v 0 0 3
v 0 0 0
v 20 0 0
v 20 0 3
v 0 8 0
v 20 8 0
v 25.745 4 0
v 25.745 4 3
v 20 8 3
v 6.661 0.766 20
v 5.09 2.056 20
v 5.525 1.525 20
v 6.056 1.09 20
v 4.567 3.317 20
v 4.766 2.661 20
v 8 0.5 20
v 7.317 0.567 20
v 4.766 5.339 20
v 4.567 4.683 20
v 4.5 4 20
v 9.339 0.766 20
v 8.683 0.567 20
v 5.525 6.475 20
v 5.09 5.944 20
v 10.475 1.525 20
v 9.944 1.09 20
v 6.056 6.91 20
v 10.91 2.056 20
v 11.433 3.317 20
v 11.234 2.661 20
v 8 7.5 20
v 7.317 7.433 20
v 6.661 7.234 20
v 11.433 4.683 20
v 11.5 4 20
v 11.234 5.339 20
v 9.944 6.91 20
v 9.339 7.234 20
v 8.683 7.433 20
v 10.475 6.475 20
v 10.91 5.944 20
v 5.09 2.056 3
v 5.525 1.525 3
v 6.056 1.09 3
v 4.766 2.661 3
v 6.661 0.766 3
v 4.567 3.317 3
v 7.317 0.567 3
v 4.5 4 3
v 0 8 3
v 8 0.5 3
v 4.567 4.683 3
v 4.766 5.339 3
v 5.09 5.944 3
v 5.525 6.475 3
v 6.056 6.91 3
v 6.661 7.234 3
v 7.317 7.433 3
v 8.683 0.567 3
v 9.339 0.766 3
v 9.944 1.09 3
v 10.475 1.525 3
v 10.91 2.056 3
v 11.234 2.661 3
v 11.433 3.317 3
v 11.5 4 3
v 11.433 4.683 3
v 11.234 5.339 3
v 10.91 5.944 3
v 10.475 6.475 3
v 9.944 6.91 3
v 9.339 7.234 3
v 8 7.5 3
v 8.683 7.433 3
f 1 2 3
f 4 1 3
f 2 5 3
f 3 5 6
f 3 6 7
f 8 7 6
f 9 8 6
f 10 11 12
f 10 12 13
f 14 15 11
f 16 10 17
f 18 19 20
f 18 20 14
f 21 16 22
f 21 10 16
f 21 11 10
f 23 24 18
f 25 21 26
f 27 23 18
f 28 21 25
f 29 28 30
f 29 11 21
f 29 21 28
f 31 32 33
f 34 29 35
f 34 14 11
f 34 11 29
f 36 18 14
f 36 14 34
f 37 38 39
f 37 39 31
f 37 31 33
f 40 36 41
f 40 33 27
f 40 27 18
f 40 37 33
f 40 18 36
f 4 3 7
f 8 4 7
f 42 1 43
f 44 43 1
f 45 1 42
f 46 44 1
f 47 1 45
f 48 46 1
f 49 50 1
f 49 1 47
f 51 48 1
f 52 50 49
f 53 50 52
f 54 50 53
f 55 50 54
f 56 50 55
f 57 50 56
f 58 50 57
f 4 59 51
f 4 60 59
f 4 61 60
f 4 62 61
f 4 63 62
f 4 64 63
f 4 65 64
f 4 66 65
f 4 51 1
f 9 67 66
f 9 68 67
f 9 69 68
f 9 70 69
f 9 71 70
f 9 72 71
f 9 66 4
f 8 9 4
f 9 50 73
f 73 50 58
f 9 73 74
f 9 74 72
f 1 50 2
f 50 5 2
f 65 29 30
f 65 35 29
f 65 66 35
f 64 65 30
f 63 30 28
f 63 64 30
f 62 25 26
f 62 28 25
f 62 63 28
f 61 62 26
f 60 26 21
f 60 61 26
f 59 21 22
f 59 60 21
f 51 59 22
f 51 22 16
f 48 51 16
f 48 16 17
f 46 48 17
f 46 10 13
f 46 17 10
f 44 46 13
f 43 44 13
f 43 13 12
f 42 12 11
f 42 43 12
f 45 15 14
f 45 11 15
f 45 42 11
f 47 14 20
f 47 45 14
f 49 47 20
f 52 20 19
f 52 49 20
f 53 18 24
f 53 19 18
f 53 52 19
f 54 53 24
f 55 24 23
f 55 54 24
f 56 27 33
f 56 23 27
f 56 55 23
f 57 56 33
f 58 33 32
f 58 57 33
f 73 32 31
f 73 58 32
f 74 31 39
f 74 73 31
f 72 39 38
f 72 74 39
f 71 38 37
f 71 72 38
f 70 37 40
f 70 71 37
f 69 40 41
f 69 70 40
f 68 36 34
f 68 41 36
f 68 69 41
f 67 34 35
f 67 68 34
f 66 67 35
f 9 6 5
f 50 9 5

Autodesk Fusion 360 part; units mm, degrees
sketch "Sketch1" plane through (0, 0, 0) normal (0, 0, 1) x (1, 0, 0)
  line L0 (0, 0) -> (20, 0)
  line L1 (20, 8) -> (0, 8)
  line L2 (0, 8) -> (0, 0)
  line L3 (20, 0) -> (25.7446, 4)
  line L4 (25.7446, 4) -> (20, 8)
  circle A0 centre (8, 4) radius 3.5
  dimension "d1" = 20
  dimension "d2" = 8
  dimension "d3" = 7
  dimension "d4" = 7
  dimension "d9" = 8
extrude "Extrude1" add sketch "Sketch1" along normal blind 3
extrude "Extrude2" add sketch "Sketch1" along normal blind 20 contours A0
